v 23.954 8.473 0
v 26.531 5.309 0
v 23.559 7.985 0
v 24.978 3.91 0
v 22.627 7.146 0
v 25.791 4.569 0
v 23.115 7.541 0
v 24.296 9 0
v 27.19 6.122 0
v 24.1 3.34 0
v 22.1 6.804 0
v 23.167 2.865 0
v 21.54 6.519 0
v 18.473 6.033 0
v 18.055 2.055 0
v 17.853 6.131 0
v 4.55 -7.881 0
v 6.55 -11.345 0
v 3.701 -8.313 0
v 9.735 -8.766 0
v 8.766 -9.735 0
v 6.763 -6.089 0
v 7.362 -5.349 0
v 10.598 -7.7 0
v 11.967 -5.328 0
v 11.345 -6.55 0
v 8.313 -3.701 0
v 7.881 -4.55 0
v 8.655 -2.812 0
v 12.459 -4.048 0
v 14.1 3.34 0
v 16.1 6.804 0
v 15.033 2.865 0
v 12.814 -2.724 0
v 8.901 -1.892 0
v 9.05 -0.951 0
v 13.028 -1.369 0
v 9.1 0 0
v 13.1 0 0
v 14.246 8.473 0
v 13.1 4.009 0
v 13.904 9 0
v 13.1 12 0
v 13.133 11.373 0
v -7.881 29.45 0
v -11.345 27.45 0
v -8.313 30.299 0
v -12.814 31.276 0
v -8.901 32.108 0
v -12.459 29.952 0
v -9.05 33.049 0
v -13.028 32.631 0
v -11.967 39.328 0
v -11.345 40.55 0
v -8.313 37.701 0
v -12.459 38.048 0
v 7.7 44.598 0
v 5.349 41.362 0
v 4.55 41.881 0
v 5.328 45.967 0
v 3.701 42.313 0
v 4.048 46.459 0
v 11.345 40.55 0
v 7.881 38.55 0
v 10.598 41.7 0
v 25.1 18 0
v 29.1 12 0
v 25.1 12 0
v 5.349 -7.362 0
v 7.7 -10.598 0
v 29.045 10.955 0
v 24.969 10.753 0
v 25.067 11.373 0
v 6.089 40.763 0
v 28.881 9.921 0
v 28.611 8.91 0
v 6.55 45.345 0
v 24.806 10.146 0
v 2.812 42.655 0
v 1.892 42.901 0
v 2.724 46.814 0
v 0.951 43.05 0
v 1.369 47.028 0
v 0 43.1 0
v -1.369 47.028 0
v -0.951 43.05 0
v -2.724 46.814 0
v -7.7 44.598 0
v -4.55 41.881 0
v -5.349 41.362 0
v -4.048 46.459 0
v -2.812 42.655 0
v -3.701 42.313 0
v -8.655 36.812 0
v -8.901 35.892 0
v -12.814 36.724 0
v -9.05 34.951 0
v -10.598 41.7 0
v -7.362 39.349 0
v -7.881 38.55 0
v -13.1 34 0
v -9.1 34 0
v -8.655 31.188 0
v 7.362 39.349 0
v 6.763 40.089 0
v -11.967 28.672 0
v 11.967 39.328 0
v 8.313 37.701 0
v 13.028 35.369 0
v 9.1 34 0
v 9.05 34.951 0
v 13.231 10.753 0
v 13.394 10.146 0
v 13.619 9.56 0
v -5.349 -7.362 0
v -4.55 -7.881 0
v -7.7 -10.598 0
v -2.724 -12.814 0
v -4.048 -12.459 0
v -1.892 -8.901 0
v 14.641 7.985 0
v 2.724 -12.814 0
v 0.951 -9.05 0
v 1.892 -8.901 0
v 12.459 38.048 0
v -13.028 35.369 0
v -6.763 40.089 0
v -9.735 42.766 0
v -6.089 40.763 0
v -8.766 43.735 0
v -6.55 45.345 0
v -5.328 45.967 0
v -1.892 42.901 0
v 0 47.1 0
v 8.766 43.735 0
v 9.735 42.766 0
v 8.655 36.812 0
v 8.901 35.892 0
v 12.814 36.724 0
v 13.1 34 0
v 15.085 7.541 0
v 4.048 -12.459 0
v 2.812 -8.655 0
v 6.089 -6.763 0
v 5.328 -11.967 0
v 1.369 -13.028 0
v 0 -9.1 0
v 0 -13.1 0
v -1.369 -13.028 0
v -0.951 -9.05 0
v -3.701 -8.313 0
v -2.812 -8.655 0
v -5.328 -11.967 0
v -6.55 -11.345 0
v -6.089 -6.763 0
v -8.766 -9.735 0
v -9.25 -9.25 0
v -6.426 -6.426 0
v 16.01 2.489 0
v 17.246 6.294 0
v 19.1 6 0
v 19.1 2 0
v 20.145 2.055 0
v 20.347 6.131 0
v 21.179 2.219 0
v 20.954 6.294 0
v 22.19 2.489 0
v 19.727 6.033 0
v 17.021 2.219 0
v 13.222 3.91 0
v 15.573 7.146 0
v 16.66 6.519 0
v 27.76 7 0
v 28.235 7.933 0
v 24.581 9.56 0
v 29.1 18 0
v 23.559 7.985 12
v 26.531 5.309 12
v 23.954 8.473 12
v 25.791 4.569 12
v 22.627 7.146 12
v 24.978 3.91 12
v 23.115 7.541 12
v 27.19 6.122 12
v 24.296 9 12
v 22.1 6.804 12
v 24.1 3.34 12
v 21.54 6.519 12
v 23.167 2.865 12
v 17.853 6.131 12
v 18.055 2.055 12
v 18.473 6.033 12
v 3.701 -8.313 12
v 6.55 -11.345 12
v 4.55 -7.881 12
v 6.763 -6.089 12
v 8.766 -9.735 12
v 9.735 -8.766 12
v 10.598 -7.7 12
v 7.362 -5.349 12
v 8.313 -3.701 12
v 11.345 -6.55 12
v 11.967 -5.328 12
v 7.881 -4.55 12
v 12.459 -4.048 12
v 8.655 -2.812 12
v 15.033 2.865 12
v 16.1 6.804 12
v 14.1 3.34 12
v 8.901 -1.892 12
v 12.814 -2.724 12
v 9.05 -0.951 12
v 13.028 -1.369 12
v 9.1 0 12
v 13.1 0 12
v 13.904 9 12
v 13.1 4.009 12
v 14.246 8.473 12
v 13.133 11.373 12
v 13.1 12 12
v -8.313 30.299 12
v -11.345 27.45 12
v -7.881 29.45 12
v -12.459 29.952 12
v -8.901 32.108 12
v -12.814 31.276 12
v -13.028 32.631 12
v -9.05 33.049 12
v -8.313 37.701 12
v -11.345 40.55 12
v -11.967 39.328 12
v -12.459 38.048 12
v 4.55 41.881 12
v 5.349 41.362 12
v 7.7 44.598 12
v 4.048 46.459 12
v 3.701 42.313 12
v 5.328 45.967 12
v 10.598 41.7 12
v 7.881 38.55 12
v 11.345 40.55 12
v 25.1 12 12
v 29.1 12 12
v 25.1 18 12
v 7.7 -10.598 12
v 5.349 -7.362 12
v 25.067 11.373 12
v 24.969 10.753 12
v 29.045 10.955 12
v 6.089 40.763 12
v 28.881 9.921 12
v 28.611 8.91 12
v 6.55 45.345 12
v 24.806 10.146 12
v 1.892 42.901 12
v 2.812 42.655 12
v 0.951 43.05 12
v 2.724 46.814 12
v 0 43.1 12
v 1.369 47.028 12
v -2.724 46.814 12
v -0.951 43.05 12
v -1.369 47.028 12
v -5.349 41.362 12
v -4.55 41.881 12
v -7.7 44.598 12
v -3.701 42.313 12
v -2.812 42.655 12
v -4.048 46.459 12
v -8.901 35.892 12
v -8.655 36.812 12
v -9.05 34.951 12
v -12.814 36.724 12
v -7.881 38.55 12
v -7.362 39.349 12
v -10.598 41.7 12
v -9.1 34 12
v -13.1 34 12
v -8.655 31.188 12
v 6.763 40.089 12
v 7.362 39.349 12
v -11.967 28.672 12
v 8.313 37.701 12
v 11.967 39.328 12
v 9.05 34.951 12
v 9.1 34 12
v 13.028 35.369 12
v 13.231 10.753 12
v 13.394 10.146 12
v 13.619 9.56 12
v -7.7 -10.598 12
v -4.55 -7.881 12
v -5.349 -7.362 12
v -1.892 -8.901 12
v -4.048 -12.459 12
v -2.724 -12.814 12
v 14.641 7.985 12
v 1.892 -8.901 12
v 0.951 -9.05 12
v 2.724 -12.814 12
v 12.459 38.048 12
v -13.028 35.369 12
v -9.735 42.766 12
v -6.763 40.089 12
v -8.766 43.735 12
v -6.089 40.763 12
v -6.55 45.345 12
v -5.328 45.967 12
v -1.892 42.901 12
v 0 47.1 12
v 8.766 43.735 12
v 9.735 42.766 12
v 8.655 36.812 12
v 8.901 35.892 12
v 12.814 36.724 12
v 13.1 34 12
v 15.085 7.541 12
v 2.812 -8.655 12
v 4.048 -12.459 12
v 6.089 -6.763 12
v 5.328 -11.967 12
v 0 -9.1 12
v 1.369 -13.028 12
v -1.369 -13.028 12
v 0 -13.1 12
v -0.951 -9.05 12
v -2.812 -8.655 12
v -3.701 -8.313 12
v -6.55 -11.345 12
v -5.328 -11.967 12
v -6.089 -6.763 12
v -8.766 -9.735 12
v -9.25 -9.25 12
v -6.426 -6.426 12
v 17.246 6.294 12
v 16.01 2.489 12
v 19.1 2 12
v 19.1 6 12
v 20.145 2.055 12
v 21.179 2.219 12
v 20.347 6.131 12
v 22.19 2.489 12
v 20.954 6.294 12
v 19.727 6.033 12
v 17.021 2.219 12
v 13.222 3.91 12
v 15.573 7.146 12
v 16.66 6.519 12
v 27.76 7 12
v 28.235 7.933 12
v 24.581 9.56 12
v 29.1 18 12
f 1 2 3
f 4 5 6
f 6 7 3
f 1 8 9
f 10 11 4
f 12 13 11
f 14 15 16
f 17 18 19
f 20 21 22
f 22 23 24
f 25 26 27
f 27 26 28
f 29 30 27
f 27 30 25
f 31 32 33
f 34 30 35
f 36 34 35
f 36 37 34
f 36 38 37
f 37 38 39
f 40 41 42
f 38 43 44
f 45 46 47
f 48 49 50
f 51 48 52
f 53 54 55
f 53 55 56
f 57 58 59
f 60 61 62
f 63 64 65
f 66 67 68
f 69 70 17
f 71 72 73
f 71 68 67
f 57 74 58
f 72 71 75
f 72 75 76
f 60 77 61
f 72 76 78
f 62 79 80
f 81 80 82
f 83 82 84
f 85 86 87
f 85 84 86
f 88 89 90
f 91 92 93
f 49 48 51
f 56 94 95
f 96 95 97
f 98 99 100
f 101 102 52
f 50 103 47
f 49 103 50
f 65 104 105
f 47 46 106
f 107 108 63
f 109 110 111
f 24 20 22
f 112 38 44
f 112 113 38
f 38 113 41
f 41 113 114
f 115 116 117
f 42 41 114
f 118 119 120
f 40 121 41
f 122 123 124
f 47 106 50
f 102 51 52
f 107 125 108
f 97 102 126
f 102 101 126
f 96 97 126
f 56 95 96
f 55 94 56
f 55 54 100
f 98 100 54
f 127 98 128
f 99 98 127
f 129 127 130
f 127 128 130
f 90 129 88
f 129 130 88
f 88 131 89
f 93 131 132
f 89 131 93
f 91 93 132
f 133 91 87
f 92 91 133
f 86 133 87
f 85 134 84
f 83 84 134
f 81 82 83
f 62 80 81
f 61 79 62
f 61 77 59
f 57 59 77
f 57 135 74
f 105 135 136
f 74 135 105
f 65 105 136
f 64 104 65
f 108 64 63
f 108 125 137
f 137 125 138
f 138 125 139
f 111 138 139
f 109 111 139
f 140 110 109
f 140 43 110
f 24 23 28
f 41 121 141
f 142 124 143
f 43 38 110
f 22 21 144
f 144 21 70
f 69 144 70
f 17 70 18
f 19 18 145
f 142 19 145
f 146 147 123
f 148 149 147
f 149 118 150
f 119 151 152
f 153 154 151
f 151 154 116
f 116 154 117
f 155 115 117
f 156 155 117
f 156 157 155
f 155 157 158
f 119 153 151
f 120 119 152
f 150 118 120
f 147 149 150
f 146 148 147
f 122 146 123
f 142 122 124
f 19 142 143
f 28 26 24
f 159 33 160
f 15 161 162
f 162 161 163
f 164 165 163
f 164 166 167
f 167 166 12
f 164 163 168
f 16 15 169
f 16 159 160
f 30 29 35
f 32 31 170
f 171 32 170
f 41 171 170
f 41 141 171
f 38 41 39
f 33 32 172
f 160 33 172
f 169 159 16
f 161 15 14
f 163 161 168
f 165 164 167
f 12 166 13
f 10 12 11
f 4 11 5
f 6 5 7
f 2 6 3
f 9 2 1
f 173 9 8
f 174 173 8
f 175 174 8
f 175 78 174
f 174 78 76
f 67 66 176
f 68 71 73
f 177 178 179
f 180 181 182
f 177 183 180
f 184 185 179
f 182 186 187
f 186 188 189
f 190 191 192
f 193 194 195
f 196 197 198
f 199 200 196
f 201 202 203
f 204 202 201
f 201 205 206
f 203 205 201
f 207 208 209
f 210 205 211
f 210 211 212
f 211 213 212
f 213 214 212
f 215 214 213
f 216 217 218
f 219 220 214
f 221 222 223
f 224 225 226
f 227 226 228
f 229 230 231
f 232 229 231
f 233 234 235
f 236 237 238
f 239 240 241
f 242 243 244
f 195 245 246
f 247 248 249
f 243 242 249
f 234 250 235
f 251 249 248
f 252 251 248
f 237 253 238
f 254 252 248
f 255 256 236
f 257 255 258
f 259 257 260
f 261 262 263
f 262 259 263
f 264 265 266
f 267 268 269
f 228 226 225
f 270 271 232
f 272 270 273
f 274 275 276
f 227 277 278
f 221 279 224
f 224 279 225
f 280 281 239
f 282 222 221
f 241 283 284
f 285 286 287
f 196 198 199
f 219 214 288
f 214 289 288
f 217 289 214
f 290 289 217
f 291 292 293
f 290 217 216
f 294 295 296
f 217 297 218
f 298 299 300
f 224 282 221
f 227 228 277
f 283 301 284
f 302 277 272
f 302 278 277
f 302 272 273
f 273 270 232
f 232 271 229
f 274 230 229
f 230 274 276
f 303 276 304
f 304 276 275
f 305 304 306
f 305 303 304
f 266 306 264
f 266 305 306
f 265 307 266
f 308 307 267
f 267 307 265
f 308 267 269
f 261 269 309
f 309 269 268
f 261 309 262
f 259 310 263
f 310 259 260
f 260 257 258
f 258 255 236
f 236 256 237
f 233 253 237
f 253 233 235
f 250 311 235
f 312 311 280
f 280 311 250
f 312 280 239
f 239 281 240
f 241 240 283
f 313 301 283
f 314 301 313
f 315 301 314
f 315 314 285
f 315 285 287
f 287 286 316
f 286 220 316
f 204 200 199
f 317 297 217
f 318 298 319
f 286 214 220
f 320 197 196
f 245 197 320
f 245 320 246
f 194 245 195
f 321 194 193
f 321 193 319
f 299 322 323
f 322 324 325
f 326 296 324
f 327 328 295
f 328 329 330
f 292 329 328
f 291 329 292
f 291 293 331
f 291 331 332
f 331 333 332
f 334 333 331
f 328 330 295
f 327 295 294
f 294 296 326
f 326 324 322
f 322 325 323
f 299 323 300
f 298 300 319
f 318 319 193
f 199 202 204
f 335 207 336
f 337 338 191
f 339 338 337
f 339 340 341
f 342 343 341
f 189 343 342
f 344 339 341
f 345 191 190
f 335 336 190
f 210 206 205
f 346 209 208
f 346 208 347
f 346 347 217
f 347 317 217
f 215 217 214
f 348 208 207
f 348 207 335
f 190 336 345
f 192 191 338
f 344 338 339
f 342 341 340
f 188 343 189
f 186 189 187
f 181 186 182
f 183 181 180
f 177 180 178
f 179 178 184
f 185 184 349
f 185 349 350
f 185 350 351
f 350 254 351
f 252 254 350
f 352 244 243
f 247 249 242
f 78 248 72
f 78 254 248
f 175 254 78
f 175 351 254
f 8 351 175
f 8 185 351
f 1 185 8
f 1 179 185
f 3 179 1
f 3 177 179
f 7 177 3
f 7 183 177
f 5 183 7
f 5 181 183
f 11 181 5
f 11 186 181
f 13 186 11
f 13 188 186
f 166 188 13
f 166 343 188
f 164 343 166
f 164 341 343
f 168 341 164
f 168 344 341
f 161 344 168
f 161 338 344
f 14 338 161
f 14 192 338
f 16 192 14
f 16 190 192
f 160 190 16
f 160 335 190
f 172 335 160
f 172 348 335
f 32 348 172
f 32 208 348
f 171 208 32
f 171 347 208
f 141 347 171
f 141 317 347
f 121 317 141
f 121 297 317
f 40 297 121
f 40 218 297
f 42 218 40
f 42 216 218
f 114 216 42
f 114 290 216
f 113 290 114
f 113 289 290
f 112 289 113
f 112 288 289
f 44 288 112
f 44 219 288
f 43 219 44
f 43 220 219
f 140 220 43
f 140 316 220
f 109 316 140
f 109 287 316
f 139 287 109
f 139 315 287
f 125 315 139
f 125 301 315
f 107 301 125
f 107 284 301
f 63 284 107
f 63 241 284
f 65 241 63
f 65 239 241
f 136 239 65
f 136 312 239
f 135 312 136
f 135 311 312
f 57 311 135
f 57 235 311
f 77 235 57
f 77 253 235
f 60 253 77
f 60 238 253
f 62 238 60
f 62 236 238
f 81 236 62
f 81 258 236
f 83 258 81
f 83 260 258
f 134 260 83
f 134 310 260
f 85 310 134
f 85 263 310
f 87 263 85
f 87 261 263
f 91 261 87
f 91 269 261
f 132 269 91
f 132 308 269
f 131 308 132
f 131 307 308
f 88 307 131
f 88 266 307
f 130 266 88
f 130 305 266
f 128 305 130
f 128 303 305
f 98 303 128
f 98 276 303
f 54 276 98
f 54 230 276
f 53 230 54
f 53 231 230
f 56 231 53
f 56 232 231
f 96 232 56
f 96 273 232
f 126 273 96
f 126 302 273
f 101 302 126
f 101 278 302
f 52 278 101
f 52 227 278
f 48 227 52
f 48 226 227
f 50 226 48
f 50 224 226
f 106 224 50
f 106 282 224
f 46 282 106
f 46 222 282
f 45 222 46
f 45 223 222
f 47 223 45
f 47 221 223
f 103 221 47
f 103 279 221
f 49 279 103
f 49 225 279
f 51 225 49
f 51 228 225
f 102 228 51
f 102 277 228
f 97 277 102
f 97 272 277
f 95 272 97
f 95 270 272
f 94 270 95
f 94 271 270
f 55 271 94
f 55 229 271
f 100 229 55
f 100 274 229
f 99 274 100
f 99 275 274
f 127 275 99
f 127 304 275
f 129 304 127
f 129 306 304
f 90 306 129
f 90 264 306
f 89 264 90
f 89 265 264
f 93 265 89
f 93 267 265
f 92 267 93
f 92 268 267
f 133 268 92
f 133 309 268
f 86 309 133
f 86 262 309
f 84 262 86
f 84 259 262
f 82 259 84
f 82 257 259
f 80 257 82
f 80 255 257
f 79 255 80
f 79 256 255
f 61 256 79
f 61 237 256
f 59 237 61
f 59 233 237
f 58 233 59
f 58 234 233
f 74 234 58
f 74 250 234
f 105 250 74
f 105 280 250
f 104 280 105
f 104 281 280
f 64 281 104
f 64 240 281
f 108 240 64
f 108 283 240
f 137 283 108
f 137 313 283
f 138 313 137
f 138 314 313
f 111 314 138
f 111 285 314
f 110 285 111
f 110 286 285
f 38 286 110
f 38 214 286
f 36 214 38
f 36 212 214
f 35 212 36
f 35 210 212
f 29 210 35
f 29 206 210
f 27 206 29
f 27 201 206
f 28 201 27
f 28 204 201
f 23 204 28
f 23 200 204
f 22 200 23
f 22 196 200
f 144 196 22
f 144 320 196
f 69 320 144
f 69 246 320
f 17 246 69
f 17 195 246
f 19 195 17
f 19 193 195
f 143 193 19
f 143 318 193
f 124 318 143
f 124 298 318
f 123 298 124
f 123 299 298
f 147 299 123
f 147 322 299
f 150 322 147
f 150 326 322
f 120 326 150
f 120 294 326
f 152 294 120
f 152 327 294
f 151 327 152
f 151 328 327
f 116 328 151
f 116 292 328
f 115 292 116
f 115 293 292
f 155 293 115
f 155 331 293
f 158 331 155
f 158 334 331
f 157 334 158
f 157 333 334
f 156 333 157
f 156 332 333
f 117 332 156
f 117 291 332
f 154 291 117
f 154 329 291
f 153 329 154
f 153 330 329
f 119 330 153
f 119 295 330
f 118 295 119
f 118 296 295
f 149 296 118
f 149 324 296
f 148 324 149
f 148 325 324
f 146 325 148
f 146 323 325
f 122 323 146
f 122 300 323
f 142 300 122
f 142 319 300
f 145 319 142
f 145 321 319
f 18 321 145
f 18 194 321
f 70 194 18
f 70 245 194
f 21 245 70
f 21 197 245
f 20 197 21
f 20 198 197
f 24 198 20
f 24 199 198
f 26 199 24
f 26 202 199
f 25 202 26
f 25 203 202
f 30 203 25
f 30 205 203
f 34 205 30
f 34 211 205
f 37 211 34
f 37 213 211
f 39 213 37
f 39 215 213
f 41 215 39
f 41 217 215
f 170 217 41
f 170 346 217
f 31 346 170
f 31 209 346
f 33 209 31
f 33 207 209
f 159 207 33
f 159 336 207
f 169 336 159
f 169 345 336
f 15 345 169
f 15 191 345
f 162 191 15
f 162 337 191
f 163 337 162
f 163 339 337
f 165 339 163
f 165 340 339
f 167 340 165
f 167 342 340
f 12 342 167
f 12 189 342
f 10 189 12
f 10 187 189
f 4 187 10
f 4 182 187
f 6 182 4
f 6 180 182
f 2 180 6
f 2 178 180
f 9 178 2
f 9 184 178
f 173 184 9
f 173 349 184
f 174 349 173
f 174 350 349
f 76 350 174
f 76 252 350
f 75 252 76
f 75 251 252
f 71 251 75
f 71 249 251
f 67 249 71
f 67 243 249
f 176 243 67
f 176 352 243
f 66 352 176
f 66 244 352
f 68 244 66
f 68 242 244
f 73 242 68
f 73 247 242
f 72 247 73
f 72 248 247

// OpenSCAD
diameter=18.2; // measured : bar diameter
distance=52.2; // measured : distance between the bars (including bars)
thickness=4; // wall thickness
space_h=12; // front hook distance
shift_h=12; // front hook shift
height_h=6; // front hook height
alpha_t=210; // top hook angle
alpha_b=135; // bottom hook angle
$fn=60;
width=12; // width of the hook

radius=diameter/2;
distance_c=distance-2*radius;
radius_h=space_h/2;

module part_square(p_size,p_alpha) {
if (p_alpha < 0)
    mirror([0,1]) part_square(p_size,-p_alpha);
else if (p_alpha >= 360)
    part_square(p_size,p_alpha-360);
else if (p_alpha >= 180)
    union() {
        translate([-p_size,0]) square([2*p_size,p_size]);
        rotate(180) part_square(p_size,p_alpha-180);
    }
else if (p_alpha >= 90)
    union() {
        square([p_size,p_size]);
        rotate(90) part_square(p_size,p_alpha-90);
    }
else if (p_alpha > 45)
    difference() {
        square([p_size,p_size]);
        mirror([1,-1]) part_square(p_size,90-p_alpha);
    }
else
    polygon([[0,0],[p_size,0],[p_size,tan(p_alpha)*p_size]]);
}

module part_ring(p_radius,p_thickness,p_alpha){
    p_length=p_radius+p_thickness;
    intersection() {
        difference() {
            circle(p_length);
            circle(p_radius);
        }
        part_square(p_length,p_alpha);
    };
}

linear_extrude(width){
    translate([0,distance_c]) part_ring(radius,thickness,alpha_t);
    translate([radius,0]) square([thickness,distance_c]);
    mirror([0,1]) part_ring(radius,thickness,alpha_b);
    translate([radius+radius_h+thickness,shift_h]) rotate(180) 
        part_ring(radius_h,thickness,180);
    translate([radius+2*radius_h+thickness,shift_h]) 
        square([thickness,height_h]);
}
